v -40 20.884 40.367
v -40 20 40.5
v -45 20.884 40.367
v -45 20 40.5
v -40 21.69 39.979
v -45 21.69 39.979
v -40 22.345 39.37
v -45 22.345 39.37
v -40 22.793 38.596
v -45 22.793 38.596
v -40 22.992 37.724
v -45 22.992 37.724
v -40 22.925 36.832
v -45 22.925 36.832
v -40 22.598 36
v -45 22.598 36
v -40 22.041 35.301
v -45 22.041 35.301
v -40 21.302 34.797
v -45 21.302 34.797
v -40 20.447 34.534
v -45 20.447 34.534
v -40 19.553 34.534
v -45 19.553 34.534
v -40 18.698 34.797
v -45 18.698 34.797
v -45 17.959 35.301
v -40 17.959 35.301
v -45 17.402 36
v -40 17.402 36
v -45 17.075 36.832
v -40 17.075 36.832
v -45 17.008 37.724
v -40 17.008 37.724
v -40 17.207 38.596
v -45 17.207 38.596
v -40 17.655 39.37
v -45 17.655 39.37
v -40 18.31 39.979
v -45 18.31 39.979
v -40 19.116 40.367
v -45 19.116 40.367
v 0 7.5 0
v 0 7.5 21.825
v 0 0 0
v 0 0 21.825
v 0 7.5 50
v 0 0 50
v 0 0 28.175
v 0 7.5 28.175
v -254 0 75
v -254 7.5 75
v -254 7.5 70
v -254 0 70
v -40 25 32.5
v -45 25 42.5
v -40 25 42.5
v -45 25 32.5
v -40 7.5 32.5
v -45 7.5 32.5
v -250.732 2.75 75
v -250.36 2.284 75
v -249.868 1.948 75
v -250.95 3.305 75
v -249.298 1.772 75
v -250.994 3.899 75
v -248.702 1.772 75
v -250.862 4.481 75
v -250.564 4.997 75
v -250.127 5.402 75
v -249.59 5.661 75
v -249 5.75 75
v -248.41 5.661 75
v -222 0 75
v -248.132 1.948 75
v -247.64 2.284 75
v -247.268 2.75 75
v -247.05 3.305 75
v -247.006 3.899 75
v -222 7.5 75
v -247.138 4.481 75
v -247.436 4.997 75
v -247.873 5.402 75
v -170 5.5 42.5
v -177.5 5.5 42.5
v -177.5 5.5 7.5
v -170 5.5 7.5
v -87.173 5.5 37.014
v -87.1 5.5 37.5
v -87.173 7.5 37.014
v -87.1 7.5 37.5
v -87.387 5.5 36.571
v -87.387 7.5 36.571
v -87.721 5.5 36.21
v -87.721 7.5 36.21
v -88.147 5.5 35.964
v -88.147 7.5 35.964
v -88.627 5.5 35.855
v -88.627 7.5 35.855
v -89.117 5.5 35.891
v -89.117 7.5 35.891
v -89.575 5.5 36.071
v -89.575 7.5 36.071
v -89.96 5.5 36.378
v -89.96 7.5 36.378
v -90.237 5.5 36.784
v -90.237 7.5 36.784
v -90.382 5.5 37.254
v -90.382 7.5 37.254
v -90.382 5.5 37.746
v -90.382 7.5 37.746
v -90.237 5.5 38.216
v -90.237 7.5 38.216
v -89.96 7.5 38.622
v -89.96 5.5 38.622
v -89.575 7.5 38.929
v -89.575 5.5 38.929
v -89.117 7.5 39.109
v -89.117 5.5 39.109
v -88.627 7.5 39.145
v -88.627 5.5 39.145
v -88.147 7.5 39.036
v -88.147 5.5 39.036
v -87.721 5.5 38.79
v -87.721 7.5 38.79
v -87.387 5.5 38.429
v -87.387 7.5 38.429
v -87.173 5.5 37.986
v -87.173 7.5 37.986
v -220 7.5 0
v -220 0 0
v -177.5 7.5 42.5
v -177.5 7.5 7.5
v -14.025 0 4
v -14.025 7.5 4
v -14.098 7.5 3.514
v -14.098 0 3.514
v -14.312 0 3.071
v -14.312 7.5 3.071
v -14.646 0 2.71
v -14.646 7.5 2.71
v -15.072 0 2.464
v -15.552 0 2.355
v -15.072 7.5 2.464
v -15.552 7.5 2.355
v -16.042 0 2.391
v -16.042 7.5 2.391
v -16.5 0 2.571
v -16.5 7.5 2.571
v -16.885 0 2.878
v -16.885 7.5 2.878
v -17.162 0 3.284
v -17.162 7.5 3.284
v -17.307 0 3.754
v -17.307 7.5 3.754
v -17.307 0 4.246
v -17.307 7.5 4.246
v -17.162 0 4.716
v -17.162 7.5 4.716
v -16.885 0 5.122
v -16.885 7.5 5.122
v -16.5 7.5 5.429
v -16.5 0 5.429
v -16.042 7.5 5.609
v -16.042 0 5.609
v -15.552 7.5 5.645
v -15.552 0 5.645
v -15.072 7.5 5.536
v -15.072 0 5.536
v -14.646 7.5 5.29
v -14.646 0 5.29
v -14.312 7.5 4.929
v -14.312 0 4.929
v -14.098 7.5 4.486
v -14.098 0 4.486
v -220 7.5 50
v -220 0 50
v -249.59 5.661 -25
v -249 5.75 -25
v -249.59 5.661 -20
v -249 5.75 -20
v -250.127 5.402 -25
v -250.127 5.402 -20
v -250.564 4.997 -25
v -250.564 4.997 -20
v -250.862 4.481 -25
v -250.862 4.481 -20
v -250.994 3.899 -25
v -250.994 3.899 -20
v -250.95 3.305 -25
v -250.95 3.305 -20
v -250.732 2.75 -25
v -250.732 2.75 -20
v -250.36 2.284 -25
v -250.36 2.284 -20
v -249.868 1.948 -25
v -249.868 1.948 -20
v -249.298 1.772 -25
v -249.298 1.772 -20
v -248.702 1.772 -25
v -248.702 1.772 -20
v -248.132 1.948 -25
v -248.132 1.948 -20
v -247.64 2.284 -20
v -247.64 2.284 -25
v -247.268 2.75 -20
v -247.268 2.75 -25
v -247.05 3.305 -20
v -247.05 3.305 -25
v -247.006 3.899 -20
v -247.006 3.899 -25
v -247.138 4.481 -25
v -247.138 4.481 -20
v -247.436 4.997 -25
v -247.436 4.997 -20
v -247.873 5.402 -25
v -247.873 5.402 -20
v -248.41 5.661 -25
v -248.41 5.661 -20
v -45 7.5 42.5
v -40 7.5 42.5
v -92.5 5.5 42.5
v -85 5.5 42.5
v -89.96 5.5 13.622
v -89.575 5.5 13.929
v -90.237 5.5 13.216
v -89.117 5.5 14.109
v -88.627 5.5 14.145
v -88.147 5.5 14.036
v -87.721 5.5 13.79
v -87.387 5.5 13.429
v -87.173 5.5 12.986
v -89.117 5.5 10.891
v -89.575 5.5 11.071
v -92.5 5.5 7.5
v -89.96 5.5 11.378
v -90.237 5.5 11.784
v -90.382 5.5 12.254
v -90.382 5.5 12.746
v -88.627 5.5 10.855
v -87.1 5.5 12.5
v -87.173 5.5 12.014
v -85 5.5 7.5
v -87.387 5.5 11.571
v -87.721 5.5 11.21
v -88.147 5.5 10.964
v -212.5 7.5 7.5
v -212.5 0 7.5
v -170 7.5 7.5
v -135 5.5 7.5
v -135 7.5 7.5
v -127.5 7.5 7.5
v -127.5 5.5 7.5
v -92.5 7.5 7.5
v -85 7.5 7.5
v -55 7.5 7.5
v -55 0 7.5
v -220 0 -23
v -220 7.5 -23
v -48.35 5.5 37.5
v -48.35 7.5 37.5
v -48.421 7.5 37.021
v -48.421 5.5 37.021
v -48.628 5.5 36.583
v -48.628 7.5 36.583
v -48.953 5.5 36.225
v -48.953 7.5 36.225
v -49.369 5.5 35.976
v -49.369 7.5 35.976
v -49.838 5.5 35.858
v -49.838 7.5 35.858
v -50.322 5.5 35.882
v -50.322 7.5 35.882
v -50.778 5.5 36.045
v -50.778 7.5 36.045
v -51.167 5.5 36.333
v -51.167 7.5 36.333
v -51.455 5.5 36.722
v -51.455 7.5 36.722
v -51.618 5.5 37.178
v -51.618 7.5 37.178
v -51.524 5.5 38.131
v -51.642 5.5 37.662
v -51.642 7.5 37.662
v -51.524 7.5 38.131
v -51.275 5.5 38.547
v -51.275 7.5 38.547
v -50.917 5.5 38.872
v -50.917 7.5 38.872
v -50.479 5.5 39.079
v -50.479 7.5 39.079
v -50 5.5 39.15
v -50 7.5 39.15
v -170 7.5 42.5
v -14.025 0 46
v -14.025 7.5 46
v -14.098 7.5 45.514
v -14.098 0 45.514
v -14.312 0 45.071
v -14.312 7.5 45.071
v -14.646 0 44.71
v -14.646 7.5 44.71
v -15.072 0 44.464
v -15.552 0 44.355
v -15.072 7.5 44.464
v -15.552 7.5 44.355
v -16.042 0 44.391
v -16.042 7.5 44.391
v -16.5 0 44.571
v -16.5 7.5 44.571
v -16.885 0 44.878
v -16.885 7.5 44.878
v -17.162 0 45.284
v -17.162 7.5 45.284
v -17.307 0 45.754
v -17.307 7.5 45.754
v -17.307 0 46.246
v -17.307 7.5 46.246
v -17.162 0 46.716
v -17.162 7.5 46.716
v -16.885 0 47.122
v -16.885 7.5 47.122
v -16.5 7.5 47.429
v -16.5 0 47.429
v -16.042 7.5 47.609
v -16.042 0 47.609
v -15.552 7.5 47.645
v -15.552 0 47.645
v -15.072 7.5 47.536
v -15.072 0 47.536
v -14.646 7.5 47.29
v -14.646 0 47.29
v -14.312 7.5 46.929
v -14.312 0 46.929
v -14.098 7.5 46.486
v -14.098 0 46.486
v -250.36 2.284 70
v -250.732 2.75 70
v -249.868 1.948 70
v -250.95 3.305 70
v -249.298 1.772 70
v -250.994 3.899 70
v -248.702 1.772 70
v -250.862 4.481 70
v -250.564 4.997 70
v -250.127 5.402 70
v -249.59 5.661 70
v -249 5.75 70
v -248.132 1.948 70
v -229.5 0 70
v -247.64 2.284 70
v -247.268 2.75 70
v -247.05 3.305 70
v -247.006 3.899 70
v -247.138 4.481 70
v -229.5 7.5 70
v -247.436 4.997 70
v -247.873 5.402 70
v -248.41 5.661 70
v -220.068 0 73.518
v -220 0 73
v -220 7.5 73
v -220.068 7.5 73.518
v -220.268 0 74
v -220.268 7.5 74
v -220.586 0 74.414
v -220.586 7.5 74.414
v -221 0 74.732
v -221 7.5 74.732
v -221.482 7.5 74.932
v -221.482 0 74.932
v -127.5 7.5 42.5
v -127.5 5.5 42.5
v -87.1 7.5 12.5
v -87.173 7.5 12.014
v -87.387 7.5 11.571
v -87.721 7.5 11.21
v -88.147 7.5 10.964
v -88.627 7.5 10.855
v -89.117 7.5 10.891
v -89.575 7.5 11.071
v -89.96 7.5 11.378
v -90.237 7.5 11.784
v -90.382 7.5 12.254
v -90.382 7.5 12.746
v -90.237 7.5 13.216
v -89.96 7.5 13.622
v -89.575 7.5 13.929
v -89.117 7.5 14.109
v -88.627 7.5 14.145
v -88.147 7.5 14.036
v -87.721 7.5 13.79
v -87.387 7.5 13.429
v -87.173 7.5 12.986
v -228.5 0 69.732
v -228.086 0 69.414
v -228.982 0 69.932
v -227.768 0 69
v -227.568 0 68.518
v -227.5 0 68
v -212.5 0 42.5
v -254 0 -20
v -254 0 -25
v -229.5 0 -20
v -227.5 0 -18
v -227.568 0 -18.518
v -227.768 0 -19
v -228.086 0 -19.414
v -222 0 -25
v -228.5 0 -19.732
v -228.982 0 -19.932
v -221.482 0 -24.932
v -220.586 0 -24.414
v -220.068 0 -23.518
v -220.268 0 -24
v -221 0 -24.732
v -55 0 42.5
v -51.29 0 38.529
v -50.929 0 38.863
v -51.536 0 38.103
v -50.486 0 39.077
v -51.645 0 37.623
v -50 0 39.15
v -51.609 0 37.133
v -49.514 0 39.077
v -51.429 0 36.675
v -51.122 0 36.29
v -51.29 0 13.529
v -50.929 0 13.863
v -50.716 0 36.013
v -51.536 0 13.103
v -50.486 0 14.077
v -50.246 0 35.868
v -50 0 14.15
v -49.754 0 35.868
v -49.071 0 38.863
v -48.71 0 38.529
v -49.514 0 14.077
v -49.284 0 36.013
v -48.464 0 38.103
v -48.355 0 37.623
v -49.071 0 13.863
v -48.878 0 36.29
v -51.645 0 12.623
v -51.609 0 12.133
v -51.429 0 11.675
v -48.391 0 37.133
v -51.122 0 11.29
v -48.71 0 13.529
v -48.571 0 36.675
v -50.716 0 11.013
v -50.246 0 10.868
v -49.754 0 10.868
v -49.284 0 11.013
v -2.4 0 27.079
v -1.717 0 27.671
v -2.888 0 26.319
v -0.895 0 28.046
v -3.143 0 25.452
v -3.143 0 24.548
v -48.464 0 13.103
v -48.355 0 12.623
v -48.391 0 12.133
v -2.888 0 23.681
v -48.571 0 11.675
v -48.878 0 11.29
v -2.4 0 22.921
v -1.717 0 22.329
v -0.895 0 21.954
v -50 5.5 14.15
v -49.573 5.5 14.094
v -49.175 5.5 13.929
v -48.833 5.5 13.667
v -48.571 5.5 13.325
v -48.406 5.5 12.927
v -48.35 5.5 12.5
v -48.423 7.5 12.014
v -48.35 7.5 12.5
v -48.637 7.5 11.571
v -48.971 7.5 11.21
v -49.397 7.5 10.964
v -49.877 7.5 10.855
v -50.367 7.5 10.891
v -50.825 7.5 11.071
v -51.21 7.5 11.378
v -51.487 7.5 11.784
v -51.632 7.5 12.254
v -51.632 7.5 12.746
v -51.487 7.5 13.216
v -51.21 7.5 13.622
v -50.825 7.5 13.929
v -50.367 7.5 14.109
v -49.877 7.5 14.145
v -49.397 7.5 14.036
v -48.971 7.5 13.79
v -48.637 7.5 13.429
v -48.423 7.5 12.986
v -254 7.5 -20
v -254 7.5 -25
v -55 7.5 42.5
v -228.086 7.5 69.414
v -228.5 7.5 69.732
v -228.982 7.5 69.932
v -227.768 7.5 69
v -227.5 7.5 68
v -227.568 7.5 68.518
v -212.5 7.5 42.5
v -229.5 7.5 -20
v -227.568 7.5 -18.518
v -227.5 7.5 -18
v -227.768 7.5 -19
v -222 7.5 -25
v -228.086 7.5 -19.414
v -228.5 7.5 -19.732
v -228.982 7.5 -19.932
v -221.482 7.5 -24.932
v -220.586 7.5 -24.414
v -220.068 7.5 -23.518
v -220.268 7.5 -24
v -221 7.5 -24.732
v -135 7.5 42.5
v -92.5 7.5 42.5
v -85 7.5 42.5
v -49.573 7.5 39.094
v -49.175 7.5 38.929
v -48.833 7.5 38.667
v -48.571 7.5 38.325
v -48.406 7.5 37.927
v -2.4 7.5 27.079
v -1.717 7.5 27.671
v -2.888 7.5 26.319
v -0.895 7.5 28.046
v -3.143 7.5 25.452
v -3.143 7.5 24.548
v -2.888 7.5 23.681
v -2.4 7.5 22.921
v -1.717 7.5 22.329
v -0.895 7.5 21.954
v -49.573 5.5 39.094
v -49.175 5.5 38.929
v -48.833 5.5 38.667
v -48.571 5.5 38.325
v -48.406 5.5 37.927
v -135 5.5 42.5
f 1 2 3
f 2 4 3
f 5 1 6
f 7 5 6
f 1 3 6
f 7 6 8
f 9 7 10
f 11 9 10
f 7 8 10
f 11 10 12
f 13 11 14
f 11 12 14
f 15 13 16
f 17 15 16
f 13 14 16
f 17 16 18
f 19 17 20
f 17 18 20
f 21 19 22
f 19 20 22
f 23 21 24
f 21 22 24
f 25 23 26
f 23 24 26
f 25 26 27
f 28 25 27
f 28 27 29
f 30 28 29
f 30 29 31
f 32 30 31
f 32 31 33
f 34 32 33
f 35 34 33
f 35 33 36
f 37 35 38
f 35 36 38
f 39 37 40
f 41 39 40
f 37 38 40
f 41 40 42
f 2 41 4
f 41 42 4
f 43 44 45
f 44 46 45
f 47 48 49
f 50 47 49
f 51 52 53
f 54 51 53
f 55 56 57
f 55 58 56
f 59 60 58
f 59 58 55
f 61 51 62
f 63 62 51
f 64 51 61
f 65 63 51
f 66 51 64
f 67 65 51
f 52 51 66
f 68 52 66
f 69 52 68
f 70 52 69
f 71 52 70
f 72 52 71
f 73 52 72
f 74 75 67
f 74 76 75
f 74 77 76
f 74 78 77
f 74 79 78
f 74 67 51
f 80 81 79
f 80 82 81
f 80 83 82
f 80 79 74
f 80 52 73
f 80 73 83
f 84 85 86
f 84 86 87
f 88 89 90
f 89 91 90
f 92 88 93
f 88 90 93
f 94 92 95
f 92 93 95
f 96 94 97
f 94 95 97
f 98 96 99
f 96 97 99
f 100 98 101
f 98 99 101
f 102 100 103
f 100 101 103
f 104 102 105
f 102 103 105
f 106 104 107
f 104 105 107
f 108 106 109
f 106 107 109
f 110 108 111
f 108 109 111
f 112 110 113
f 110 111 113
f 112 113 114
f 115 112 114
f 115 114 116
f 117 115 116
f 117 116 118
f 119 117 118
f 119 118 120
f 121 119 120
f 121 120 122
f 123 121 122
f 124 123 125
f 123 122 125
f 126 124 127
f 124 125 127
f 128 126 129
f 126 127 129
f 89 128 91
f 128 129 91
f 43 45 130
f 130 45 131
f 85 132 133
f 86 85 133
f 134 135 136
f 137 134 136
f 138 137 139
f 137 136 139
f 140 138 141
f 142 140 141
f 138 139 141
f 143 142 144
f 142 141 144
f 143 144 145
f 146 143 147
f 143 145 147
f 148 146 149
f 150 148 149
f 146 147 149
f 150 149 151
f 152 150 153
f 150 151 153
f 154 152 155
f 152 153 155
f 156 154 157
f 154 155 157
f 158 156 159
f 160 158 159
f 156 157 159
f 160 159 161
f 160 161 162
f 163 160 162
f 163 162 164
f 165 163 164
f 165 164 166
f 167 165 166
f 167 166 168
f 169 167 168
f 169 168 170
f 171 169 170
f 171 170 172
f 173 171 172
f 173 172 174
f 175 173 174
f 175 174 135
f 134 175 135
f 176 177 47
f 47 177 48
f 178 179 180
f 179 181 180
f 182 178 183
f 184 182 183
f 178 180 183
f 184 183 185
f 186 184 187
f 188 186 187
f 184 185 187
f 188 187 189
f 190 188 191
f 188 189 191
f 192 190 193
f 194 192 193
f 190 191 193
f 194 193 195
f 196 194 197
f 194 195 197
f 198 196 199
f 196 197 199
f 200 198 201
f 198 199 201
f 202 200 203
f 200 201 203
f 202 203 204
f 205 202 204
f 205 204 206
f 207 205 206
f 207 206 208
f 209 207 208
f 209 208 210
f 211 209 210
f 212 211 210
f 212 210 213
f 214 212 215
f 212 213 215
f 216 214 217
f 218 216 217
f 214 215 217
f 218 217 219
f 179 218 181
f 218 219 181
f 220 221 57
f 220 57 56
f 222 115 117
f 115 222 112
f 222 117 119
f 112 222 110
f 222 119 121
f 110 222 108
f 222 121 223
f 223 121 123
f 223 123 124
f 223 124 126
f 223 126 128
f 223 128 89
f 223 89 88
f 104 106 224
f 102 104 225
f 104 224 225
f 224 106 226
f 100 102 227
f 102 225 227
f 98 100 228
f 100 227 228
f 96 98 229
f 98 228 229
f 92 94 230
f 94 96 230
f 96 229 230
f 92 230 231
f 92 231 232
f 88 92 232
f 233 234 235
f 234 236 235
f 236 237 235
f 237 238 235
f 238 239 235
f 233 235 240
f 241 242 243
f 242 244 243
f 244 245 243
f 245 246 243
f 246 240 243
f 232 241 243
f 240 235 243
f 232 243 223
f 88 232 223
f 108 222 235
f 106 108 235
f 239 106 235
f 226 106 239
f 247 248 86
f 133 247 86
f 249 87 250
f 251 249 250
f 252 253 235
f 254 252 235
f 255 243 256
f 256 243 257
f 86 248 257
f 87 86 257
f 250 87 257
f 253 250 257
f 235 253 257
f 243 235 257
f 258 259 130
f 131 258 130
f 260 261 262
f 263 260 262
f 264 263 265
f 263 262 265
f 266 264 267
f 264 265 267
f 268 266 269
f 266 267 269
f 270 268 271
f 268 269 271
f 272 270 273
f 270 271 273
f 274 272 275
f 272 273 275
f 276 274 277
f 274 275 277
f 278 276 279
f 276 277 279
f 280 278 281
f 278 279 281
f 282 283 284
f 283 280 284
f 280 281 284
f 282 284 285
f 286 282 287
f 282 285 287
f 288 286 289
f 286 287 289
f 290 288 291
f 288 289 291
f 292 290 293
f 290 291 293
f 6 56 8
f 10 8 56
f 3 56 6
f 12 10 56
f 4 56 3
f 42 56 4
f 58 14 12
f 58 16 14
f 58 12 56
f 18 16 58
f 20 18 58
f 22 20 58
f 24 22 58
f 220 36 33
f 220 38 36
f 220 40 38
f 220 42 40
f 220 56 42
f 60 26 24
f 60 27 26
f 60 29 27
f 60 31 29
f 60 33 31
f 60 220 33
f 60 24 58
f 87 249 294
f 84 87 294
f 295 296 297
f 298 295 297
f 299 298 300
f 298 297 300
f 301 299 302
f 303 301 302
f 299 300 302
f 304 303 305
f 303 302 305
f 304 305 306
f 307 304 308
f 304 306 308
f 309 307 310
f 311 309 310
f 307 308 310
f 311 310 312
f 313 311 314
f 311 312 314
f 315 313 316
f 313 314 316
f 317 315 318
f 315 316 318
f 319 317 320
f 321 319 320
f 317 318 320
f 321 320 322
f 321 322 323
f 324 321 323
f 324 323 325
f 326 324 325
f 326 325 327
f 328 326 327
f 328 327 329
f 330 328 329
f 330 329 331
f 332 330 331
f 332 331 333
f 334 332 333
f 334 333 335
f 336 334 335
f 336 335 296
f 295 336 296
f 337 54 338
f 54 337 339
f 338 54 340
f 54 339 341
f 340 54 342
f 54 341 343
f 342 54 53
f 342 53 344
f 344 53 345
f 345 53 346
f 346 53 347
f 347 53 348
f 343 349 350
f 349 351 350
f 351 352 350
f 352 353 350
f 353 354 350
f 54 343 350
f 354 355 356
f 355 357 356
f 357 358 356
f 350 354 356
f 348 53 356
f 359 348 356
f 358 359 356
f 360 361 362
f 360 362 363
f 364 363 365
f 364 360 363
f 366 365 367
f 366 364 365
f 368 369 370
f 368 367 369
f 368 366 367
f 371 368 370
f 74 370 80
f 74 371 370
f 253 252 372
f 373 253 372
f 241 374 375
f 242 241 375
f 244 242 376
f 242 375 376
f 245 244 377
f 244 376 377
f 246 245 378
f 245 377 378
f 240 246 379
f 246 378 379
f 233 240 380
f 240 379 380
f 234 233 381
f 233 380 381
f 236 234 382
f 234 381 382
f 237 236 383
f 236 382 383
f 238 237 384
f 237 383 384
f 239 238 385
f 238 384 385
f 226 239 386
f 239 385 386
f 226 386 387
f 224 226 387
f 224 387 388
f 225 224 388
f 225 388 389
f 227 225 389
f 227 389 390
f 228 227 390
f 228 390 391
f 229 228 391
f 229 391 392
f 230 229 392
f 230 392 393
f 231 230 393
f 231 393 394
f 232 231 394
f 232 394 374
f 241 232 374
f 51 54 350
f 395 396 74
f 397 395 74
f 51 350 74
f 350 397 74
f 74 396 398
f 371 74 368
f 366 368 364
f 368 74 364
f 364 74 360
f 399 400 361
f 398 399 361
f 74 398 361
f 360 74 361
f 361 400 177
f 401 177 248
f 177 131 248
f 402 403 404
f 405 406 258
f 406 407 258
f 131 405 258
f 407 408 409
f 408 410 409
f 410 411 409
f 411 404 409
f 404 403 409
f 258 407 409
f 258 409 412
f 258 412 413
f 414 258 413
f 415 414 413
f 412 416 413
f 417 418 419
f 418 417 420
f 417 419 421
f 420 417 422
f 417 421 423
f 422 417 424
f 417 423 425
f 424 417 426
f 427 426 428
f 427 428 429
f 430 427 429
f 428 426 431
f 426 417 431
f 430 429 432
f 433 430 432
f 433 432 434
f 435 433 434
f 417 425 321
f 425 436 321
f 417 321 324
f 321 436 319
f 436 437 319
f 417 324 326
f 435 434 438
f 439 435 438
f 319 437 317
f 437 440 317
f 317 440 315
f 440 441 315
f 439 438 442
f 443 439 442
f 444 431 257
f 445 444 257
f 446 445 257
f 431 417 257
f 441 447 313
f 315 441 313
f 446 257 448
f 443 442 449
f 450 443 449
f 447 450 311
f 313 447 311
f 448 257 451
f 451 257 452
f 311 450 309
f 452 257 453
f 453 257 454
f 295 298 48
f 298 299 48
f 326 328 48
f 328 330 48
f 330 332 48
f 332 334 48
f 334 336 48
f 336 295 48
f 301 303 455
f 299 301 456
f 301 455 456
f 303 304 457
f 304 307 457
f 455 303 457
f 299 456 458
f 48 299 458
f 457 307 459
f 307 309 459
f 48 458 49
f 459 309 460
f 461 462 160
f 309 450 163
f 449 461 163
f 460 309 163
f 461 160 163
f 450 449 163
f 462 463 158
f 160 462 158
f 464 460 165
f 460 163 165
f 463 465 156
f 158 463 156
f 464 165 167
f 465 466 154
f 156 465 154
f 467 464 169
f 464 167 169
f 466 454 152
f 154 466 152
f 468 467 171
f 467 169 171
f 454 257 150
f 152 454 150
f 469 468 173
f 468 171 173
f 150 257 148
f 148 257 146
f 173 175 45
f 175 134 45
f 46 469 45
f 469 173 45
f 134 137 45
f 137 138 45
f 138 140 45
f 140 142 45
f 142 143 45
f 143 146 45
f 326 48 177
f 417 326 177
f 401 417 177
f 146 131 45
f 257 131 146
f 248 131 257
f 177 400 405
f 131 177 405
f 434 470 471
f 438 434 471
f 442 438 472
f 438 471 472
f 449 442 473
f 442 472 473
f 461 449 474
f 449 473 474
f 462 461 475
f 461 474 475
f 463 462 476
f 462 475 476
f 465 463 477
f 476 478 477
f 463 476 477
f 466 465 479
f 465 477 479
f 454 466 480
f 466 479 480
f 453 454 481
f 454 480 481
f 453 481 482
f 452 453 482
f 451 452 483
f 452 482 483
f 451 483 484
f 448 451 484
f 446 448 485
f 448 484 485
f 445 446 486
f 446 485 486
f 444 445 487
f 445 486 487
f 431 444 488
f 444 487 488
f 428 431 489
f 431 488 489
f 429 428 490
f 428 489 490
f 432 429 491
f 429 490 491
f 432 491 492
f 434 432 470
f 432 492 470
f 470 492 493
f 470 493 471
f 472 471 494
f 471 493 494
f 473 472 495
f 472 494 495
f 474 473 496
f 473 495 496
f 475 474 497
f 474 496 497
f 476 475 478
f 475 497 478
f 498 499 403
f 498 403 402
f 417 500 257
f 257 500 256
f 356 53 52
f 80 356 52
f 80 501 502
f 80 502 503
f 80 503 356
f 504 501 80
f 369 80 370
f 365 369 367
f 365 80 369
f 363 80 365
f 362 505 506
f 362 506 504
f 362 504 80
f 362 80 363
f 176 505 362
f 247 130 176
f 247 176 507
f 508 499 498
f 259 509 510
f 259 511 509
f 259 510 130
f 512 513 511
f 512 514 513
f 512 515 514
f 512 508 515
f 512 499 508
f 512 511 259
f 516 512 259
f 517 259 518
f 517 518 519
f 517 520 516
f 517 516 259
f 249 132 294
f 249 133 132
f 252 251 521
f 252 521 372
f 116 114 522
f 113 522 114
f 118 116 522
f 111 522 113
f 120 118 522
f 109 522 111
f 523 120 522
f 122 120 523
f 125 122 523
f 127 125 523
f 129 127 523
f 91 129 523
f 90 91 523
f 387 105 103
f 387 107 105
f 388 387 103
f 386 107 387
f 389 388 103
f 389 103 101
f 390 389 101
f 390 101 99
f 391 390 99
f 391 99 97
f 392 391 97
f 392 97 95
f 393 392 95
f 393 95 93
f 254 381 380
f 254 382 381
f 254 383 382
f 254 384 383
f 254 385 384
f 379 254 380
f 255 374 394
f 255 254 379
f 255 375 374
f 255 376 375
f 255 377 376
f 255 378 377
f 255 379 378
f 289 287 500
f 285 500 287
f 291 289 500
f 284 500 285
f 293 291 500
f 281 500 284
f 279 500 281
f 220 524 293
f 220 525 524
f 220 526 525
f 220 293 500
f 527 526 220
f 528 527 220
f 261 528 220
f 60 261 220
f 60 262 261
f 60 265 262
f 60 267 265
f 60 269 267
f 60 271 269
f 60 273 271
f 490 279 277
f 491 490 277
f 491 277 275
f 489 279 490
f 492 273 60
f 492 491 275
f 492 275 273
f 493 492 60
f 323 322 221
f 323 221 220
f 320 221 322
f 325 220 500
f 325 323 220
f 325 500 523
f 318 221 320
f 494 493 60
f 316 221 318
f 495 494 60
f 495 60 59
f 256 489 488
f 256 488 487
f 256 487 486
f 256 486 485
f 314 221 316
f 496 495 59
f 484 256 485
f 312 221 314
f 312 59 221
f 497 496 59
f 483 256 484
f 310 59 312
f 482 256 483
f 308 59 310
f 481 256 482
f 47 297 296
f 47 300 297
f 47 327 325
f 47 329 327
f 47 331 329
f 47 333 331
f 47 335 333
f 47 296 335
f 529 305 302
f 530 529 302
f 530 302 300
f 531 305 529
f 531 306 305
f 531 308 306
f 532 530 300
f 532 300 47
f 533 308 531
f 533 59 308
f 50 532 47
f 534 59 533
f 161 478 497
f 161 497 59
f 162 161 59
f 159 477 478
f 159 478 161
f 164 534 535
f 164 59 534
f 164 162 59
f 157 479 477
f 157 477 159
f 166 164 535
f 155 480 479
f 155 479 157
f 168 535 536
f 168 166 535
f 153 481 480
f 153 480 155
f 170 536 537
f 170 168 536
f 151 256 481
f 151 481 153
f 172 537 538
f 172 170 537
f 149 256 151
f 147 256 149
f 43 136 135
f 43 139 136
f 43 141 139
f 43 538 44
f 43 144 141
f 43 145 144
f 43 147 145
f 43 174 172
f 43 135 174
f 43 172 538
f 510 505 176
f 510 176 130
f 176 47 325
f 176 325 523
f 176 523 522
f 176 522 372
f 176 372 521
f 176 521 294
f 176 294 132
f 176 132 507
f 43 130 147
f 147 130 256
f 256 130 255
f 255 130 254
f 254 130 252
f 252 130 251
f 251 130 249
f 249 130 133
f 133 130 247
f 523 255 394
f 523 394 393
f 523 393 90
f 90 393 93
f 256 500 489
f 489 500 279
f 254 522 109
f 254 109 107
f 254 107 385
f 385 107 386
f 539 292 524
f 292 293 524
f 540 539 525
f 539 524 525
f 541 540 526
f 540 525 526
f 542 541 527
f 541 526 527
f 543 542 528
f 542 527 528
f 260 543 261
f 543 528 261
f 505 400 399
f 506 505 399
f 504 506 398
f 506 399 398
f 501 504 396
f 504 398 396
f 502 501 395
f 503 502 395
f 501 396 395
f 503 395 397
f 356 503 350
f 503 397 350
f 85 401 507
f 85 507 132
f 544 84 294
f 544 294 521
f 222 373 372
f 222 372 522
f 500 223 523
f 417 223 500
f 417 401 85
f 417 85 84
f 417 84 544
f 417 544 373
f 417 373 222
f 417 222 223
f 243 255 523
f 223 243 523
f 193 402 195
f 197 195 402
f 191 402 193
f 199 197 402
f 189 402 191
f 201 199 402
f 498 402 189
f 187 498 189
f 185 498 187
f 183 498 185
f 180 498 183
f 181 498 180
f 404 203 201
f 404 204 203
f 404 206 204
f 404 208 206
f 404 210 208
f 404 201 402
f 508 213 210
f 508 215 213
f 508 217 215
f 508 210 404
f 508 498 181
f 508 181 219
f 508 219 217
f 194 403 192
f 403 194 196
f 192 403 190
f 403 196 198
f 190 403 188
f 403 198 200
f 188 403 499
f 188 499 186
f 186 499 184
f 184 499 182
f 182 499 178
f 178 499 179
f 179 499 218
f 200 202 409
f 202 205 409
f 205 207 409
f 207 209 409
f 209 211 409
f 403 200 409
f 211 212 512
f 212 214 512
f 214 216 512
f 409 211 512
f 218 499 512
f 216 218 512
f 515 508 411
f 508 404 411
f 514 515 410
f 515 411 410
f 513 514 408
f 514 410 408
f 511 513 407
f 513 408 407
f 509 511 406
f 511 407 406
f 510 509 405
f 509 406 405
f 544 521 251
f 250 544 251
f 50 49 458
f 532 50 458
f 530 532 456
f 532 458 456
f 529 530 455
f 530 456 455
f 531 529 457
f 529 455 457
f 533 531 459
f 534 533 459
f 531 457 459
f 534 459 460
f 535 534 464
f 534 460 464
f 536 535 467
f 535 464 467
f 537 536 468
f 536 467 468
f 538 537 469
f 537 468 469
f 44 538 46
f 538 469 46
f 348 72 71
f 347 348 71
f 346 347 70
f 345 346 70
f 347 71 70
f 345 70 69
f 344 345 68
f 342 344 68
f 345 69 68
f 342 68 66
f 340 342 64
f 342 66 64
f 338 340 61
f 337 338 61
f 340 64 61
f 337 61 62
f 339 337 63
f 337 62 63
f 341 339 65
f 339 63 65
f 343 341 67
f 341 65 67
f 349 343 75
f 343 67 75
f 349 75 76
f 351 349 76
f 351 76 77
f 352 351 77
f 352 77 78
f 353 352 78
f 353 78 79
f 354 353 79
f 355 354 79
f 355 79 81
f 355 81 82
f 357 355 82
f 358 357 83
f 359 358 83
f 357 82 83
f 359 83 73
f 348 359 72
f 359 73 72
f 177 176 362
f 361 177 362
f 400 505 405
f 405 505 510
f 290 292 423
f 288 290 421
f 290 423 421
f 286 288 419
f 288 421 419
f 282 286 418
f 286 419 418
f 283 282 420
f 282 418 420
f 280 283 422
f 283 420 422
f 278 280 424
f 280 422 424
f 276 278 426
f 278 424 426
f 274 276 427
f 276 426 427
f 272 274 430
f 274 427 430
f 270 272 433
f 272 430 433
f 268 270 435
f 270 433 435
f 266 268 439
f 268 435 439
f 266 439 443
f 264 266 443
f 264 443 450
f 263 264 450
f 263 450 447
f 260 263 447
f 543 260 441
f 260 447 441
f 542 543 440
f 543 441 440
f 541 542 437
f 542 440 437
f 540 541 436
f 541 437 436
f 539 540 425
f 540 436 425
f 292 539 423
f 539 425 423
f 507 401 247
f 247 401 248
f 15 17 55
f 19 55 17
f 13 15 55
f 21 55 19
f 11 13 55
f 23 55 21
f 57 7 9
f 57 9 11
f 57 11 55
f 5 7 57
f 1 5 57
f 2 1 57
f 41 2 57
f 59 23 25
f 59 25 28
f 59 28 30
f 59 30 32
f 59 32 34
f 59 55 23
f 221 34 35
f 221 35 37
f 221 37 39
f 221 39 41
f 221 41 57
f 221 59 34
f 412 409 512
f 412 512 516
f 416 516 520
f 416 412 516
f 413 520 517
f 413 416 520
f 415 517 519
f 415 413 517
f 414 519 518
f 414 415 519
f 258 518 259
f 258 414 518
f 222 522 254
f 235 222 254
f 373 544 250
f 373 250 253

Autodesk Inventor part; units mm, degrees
ref_plane "YZ Plane" through (0, 0, 0) normal (1, 0, 0) x (0, 1, 0)
ref_plane "XZ Plane" through (0, 0, 0) normal (0, 1, 0) x (-1, 0, 0)
ref_plane "XY Plane" through (0, 0, 0) normal (0, 0, 1) x (1, 0, 0)
sketch "Sketch1" plane through (0, 0, 0) normal (0, 1, 0) x (-1, 0, 0)
  line L0 (0, 0) -> (50, 0)
  line L1 (50, 0) -> (50, 50)
  line L2 (50, 50) -> (0, 50)
  line L3 (0, 50) -> (0, 0)
  line L4 (50, 50) -> (290, 50)
  line L5 (290, 50) -> (290, 42.5)
  line L6 (290, 42.5) -> (50, 42.5)
  line L7 (50, 42.5) -> (50, 50)
  line L8 (50, 0) -> (290, 0)
  line L9 (290, 0) -> (290, 7.5)
  line L10 (290, 7.5) -> (50, 7.5)
  line L11 (50, 7.5) -> (50, 0)
  dimension "d0" = 50
  dimension "d1" = 50
  dimension "d2" = 240
  dimension "d3" = 7.5
  dimension "d4" = 7.5
extrude "Extrusion1" add sketch "Sketch1" along normal blind 7.5
sketch "Sketch2" plane through (0, 7.5, 0) normal (0, 1, 0) x (1, 0, 0)
  line L0 (0, -50) -> (0, 0) projected
  point P0 (0, -25)
hole "Hole1" at (0, 7.5, 25) direction (0, -1, 0) diameter 6.35 end through all
sketch "Sketch3" plane through (0, 7.5, 0) normal (0, 1, 0) x (1, 0, 0)
  line L0 (-3.175, -50) -> (-3.175, 0) construction
  line L1 (-3.175, -50) -> (-28.175, -50) construction
  line L2 (-28.175, -50) -> (-28.175, 0) construction
  line L3 (-28.175, 0) -> (-3.175, 0) construction
  point P0 (0, 0)
  point P1 (-7.175, -4)
  point P2 (-24.175, -46)
  dimension "d14" = 25
hole "Hole2" at (-7.175, 7.5, 4) at (-24.175, 7.5, 46) direction (0, -1, 0) diameter 3.3 end through all
sketch "Sketch4" plane through (0, 7.5, 0) normal (0, 1, 0) x (1, 0, 0)
  arc A0 (0, -21.825) -> (0, -28.175) centre (0, -25) ccw construction
  line L0 (-3.175, -25) -> (-28.175, -25) construction
  line L1 (-3.175, -25) -> (21.825, -25) construction
  line L2 (-290, -50) -> (0, -50) construction
  line L3 (-28.175, -50) -> (-28.175, 0) construction
  line L4 (-50, -7.5) -> (-50, -42.5) construction
  line L5 (-50, -42.5) -> (-45, -42.5) construction
  line L6 (-45, -42.5) -> (-45, -32.5) construction
  line L7 (-45, -32.5) -> (-50, -32.5) construction
  line L8 (-50, -32.5) -> (-50, -42.5) construction
  line L9 (-45, -32.5) -> (-40, -32.5)
  line L10 (-40, -32.5) -> (-40, -42.5)
  line L11 (-40, -42.5) -> (-45, -42.5)
  line L12 (-45, -42.5) -> (-45, -32.5)
  point P0 (0, 0)
  dimension "d22" = 25
  dimension "d23" = 180
  dimension "d24" = 5
  dimension "d25" = 10
  dimension "d26" = 5
extrude "Extrusion2" add sketch "Sketch4" along normal blind 17.5
sketch "Sketch5" plane through (0, 7.5, 0) normal (0, 1, 0) x (1, 0, 0)
  line L0 (-85, -7.5) -> (-85, -42.5)
  line L1 (-127.5, -7.5) -> (-127.5, -42.5)
  line L2 (-92.5, -42.5) -> (-92.5, -7.5)
  line L3 (-135, -7.5) -> (-170, -7.5) construction
  line L4 (-170, -7.5) -> (-170, -42.5) construction
  line L5 (-170, -42.5) -> (-135, -42.5) construction
  line L6 (-135, -42.5) -> (-135, -7.5) construction
  line L7 (-177.5, -7.5) -> (-212.5, -7.5) construction
  line L8 (-212.5, -7.5) -> (-212.5, -42.5) construction
  line L9 (-212.5, -42.5) -> (-177.5, -42.5) construction
  line L10 (-177.5, -42.5) -> (-177.5, -7.5) construction
  line L11 (-220, -7.5) -> (-255, -7.5) construction
  line L12 (-255, -7.5) -> (-255, -42.5) construction
  line L13 (-255, -42.5) -> (-220, -42.5) construction
  line L14 (-220, -42.5) -> (-220, -7.5) construction
  line L15 (-85, -7.5) -> (-92.5, -7.5) construction
  line L16 (-92.5, -7.5) -> (-92.5, -42.5) construction
  line L17 (-92.5, -42.5) -> (-85, -42.5) construction
  line L18 (-85, -42.5) -> (-85, -7.5) construction
  line L19 (-127.5, -7.5) -> (-135, -7.5) construction
  line L20 (-135, -7.5) -> (-135, -42.5) construction
  line L21 (-135, -42.5) -> (-127.5, -42.5) construction
  line L22 (-127.5, -42.5) -> (-127.5, -7.5) construction
  line L23 (-170, -7.5) -> (-177.5, -7.5) construction
  line L24 (-177.5, -7.5) -> (-177.5, -42.5) construction
  line L25 (-177.5, -42.5) -> (-170, -42.5) construction
  line L26 (-170, -42.5) -> (-170, -7.5) construction
  line L27 (-212.5, -7.5) -> (-220, -7.5) construction
  line L28 (-220, -7.5) -> (-220, -42.5) construction
  line L29 (-220, -42.5) -> (-212.5, -42.5) construction
  line L30 (-212.5, -42.5) -> (-212.5, -7.5) construction
  line L31 (-220, -7.5) -> (-212.5, -7.5)
  line L32 (-212.5, -7.5) -> (-212.5, -42.5)
  line L33 (-212.5, -42.5) -> (-220, -42.5)
  line L34 (-220, -42.5) -> (-220, -7.5)
  line L35 (-177.5, -7.5) -> (-170, -7.5)
  line L36 (-170, -7.5) -> (-170, -42.5)
  line L37 (-170, -42.5) -> (-177.5, -42.5)
  line L38 (-177.5, -42.5) -> (-177.5, -7.5)
  line L39 (-135, -7.5) -> (-127.5, -7.5)
  line L40 (-127.5, -7.5) -> (-127.5, -42.5)
  line L41 (-127.5, -42.5) -> (-135, -42.5)
  line L42 (-135, -42.5) -> (-135, -7.5)
  line L43 (-92.5, -7.5) -> (-85, -7.5)
  line L44 (-85, -7.5) -> (-85, -42.5)
  line L45 (-85, -42.5) -> (-92.5, -42.5)
  line L46 (-92.5, -42.5) -> (-92.5, -7.5)
  point P0 (0, 0)
  point P1 (-50, -7.5)
  dimension "d30" = 35
  dimension "d31" = 35
  dimension "d32" = 35
  dimension "d33" = 35
  dimension "d34" = 35
  dimension "d35" = 35
extrude "Extrusion3" add sketch "Sketch5" against normal blind 2
sketch "Sketch6" plane through (0, 7.5, 0) normal (0, 1, 0) x (1, 0, 0)
  line L0 (-290, 0) -> (-290, -7.5) projected
  line L1 (-290, -50) -> (0, -50) projected
  line L2 (-290, 0) -> (-280, 0)
  line L3 (-280, 0) -> (-280, -50)
  line L4 (-280, -50) -> (-290, -50)
  line L5 (-290, -50) -> (-290, 0)
  point P0 (0, 0)
  dimension "d38" = 10
extrude "Extrusion4" cut sketch "Sketch6" against normal blind 7.5
sketch "Sketch7" plane through (-280, 7.5, 0) normal (-1, 0, 0) x (0, 0, 1)
  point P0 (0, -7.5)
sketch "Sketch8" plane through (-280, 7.5, 0) normal (-1, 0, 0) x (0, 0, 1)
  line L0 (-25, 0) -> (75, 0)
  line L1 (75, 0) -> (75, -7.5)
  line L2 (75, -7.5) -> (-25, -7.5)
  line L3 (-25, -7.5) -> (-25, 0)
  line L4 (-25, 0) -> (75, 0)
  line L5 (75, 0) -> (75, -10)
  line L6 (75, -10) -> (-25, -10)
  line L7 (-25, -10) -> (-25, 0)
  point P0 (0, -7.5)
  dimension "d41" = 100
  dimension "d42" = 10
extrude "Extrusion5" add sketch "Sketch8" along normal blind 7.5
sketch "Sketch9" plane through (-287.5, 7.5, 0) normal (-1, 0, 0) x (0, 0, 1)
  line L0 (75, 0) -> (-25, 0) projected
  line L1 (-25, -10) -> (75, -10) projected
  line L2 (-25, 0) -> (-17.5, 0)
  line L3 (-17.5, 0) -> (-17.5, -10)
  line L4 (-17.5, -10) -> (-25, -10)
  line L5 (-25, -10) -> (-25, 0)
  line L6 (75, 0) -> (67.5, 0)
  line L7 (67.5, 0) -> (67.5, -10)
  line L8 (67.5, -10) -> (75, -10)
  line L9 (75, -10) -> (75, 0)
  point P0 (0, -7.5)
  dimension "d45" = 7.5
  dimension "d46" = 7.5
extrude "Extrusion6" add sketch "Sketch9" along normal blind 25 contours L9 L1 L7 L0 | L3 L1 L5 L0
sketch "Sketch10" plane through (-287.5, -2.5, -17.5) normal (0, 0, 1) x (1, 0, 0)
  line L0 (0, 0) -> (-25, 0) construction
  line L1 (0, 0) -> (-3, 0) construction
  line L2 (-3, 0) -> (-6.2, 0)
  line L3 (-6.2, 0) -> (-6.2, 2.1)
  line L4 (-6.2, 2.1) -> (-3, 2.1)
  line L5 (-3, 2.1) -> (-3, 0)
  line L6 (-6.2, 2.1) -> (-11.7, 2.1) construction
  line L7 (-11.7, 2.1) -> (-11.7, 5.4) construction
  point P0 (287.5, 2.5)
  dimension "d49" = 3
  dimension "d50" = 3.2
  dimension "d51" = 2.1
  dimension "d52" = 5.5
  dimension "d53" = 3.3
extrude "Extrusion7" add sketch "Sketch10" along normal blind 92.5
sketch "Sketch11" plane through (-287.5, -2.5, -17.5) normal (0, 0, 1) x (1, 0, 0)
  line L0 (-6.2, 2.1) -> (-3, 2.1) construction
  line L1 (-6.2, 2.1) -> (-11.7, 2.1) construction
  line L2 (-11.7, 2.1) -> (-11.7, 5.4) construction
  circle A0 centre (-11.7, 5.4) radius 2.125
  point P0 (287.5, 2.5)
  dimension "d56" = 5.5
  dimension "d57" = 3.3
  dimension "d58" = 4.25
extrude "Extrusion8" cut sketch "Sketch11" along normal mid plane 241
sketch "Sketch12" plane through (-287.5, -2.5, -17.5) normal (0, 0, 1) x (1, 0, 0)
  circle A0 centre (-11.7, 5.4) radius 2.125 construction
  line L0 (-11.7, 5.4) -> (-11.7, 0.96) construction
  line L1 (-11.7, 0.96) -> (-16.7, 0.96) construction
  line L2 (-6.2, 0) -> (-25, 0) projected
  line L3 (-16.7, 0.96) -> (-19.2, 0.96)
  line L4 (-19.2, 0.96) -> (-19.2, 0)
  line L5 (-19.2, 0) -> (-16.7, 0)
  line L6 (-16.7, 0) -> (-16.7, 0.96)
  point P0 (287.5, 2.5)
  dimension "d61" = 4.44
  dimension "d62" = 5
  dimension "d63" = 2.5
extrude "Extrusion9" add sketch "Sketch12" along normal blind 91.25
sketch "Sketch13" plane through (-293.7, -0.4, -17.5) normal (0, 1, 0) x (1, 0, 0)
  line L0 (3.2, 0) -> (3.2, -85) construction
  line L1 (3.2, 0) -> (3.2, -30) construction
  line L2 (0, 0) -> (0, -85) construction
  line L3 (3.2, -30) -> (0, -30) construction
  line L4 (0, -30) -> (0, -36.35) construction
  line L5 (0, -36.35) -> (3.2, -36.35) construction
  line L6 (3.2, -36.35) -> (3.2, -30) construction
  line L7 (0, -30) -> (3.2, -30)
  line L8 (3.2, -30) -> (3.2, -36.35)
  line L9 (3.2, -36.35) -> (0, -36.35)
  line L10 (0, -36.35) -> (0, -30)
  point P0 (293.7, -17.5)
  dimension "d66" = 30
  dimension "d67" = 6.35
extrude "Extrusion10" add sketch "Sketch13" along normal blind 3.8
sketch "Sketch14" plane through (0, 7.5, 0) normal (0, 1, 0) x (1, 0, 0)
  line L0 (-287.5, 17.5) -> (-287.5, -67.5) projected
  line L1 (-287.5, 17.5) -> (-285, 17.5)
  line L2 (-285, 17.5) -> (-285, -67.5)
  line L3 (-285, -67.5) -> (-287.5, -67.5)
  line L4 (-287.5, -67.5) -> (-287.5, 17.5)
  point P0 (0, 0)
  dimension "d70" = 2.5
extrude "Extrusion11" cut sketch "Sketch14" against normal blind 14.55
sketch "Sketch15" plane through (0, 7.5, 0) normal (0, 1, 0) x (1, 0, 0)
  line L0 (-312.5, 17.5) -> (-312.5, 25) projected
  line L1 (-280, -75) -> (-312.5, -75) projected
  line L2 (-312.5, 25) -> (-306.6488, 25)
  line L3 (-306.6488, 25) -> (-306.6488, -75)
  line L4 (-306.6488, -75) -> (-312.5, -75)
  line L5 (-312.5, -75) -> (-312.5, 25)
  point P0 (0, 0)
extrude "Extrusion12" cut sketch "Sketch15" against normal blind 14.55
fillet "Fillet1" radius 0.1 1 edges at (-301.325, 2.9, -17.5)
fillet "Fillet2" radius 0.1 1 edges at (-301.325, 2.9, 67.5)
fillet "Fillet3" radius 3.25 1 edges at (-280, 2.5, 75)
fillet "Fillet4" radius 3.25 1 edges at (-285, 2.5, 67.5)
fillet "Fillet5" radius 3.25 1 edges at (-280, 2.5, -25)
fillet "Fillet6" radius 3.25 1 edges at (-285, 2.5, -17.5)
sketch "Sketch16" plane through (0, 7.5, 0) normal (0, 1, 0) x (1, 0, 0)
  line L0 (-220, -42.5) -> (-220, -7.5) construction
  line L1 (-220, -42.5) -> (-280, -42.5) construction
  line L2 (-220, -7.5) -> (-255, -7.5) construction
  line L3 (-255, -7.5) -> (-255, -42.5) construction
  line L4 (-255, -42.5) -> (-220, -42.5) construction
  line L5 (-220, -42.5) -> (-220, -7.5) construction
  line L6 (-280, -7.5) -> (-280, 0) projected
  line L7 (-280, -7.5) -> (-270, -7.5)
  line L8 (-270, -7.5) -> (-270, -42.5)
  line L9 (-270, -42.5) -> (-280, -42.5)
  line L10 (-280, -42.5) -> (-280, -7.5)
  point P0 (0, 0)
  dimension "d81" = 35
  dimension "d82" = 10
extrude "Extrusion13" add sketch "Sketch16" against normal blind 2
sketch "Sketch17" plane through (0, 7.5, 0) normal (0, 1, 0) x (1, 0, 0)
  point P0 (0, 0)
sketch "Sketch18" plane through (0, 7.5, 0) normal (0, 1, 0) x (1, 0, 0)
  line L0 (-270, -7.5) -> (-270, -42.5) construction
  line L1 (-285, -64.25) -> (-285, 14.25) construction
  line L2 (-280, -7.5) -> (-280, 0) construction
  line L3 (-270, -7.5) -> (-280, -7.5) construction
  line L4 (-275, -7.5) -> (-275, -42.5) construction
  line L5 (-50, -42.5) -> (-280, -42.5) construction
  circle A0 centre (-275, -12.5) radius 1.8 construction
  circle A1 centre (-275, -37.5) radius 1.8 construction
  circle A2 centre (-275, -12.5) radius 1.8
  circle A3 centre (-275, -37.5) radius 1.8
  point P0 (0, 0)
  dimension "d85" = 3.6
  dimension "d86" = 3.6
hole "Hole3" at (-275, 7.5, 12.5) at (-275, 7.5, 37.5) direction (0, -1, 0) diameter 3.3 depth 15 tip angle 118
sketch "Sketch19" plane through (0, 7.5, 0) normal (0, 1, 0) x (1, 0, 0)
  circle A0 centre (-275, -12.5) radius 1.65 construction
  line L0 (-275, -12.5) -> (-212.5, -12.5) construction
  line L1 (-212.5, -7.5) -> (-212.5, -42.5) construction
  circle A1 centre (-275, -37.5) radius 1.65 construction
  line L2 (-275, -37.5) -> (-212.5, -37.5) construction
  line L3 (-220, -42.5) -> (-220, -7.5) construction
  line L4 (-220, -12.5) -> (-212.5, -12.5) construction
  line L5 (-216.25, -12.5) -> (-216.25, -37.5) construction
  point P0 (0, 0)
hole "Hole4" at (-216.25, 7.5, 12.5) at (-216.25, 7.5, 37.5) direction (0, -1, 0) diameter 3.3 depth 15 tip angle 118
sketch "Sketch20" plane through (-45, 7.5, 32.5) normal (-1, 0, 0) x (0, 0, 1)
  line L0 (10, 17.5) -> (0, 17.5) construction
  line L1 (5, 17.5) -> (5, -0.1335) construction
  line L2 (10, 0) -> (10, 17.5) construction
  line L3 (10, 12.5) -> (5, 12.5) construction
  circle A0 centre (5, 12.5) radius 3
  point P0 (-32.5, -7.5)
  dimension "d101" = 6
extrude "Extrusion14" cut sketch "Sketch20" against normal blind 20
sketch "Sketch21" plane through (0, 7.5, 0) normal (0, 1, 0) x (1, 0, 0)
  line L0 (-306.6488, 17.5) -> (-306.6488, -67.5) projected
  line L1 (-306.6488, 17.5) -> (-288.25, 17.5) projected
  line L2 (-306.6488, -67.5) -> (-288.25, -67.5)
  line L3 (-288.25, -67.5) -> (-288.25, 17.5)
  line L4 (-288.25, 17.5) -> (-306.6488, 17.5)
  line L5 (-306.6488, 17.5) -> (-306.6488, -67.5)
  point P0 (0, 0)
extrude "Extrusion15" cut sketch "Sketch21" against normal blind 10
sketch "Sketch22" plane through (0, 7.5, 0) normal (0, 1, 0) x (1, 0, 0)
  line L0 (-280, -50) -> (0, -50) projected
  line L1 (0, 0) -> (-280, 0) projected
  line L2 (-280, -50) -> (-270.5687, -50)
  line L3 (-270.5687, -50) -> (-270.5687, 0)
  line L4 (-270.5687, 0) -> (-280, 0)
  line L5 (-280, 0) -> (-280, -50)
  line L6 (-50, -42.5) -> (-280, -42.5) projected
  line L7 (-219.3019, -42.5) -> (-213.3073, -42.5)
  line L8 (-213.3073, -42.5) -> (-213.3073, -8.284)
  line L9 (-213.3073, -8.284) -> (-219.3019, -8.284)
  line L10 (-219.3019, -8.284) -> (-219.3019, -42.5)
extrude "Extrusion16" add sketch "Sketch22" against normal blind 2
sketch "Sketch23" plane through (-306.6488, -2.5, -25) normal (0, 0, -1) x (-1, 0, 0)
  circle A0 centre (-7.4488, 5.4) radius 2.125 projected
  circle A1 centre (-7.4488, 5.4) radius 2
  circle A2 centre (-7.4488, 5.4) radius 2.4429
  point P0 (-306.6488, 2.5)
  dimension "d108" = 4
extrude "Extrusion17" add sketch "Sketch23" against normal blind 100 contours A0 | A2
sketch "Sketch24" plane through (0, 7.5, 0) normal (0, 1, 0) x (1, 0, 0)
  line L0 (-288.25, -67.5) -> (-306.6488, -67.5) projected
  arc A0 (-285, 14.25) -> (-288.25, 17.5) centre (-288.25, 14.25) ccw projected
  line L1 (-306.6488, -67.5) -> (-288.25, -67.5)
  line L2 (-288.25, -67.5) -> (-288.25, 17.5)
  line L3 (-288.25, 17.5) -> (-306.6488, 17.5)
  line L4 (-306.6488, 17.5) -> (-306.6488, -67.5)
  point P0 (0, 0)
extrude "Extrusion18" cut sketch "Sketch24" against normal blind 100
sketch "Sketch25" plane through (0, 7.5, 0) normal (0, 1, 0) x (1, 0, 0)
  line L0 (-50, -42.5) -> (-280, -42.5) projected
  line L1 (-280, -7.5) -> (-50, -7.5) projected
  line L2 (-50, -42.5) -> (-55, -42.5)
  line L3 (-55, -42.5) -> (-55, -7.5)
  line L4 (-55, -7.5) -> (-50, -7.5)
  line L5 (-50, -7.5) -> (-50, -42.5)
  point P0 (0, 0)
  dimension "d113" = 5
extrude "Extrusion19" add sketch "Sketch25" against normal blind 2
sketch "Sketch26" plane through (0, 7.5, 0) normal (0, 1, 0) x (1, 0, 0)
  line L0 (-55, -42.5) -> (-85, -42.5) construction
  line L1 (-55, -42.5) -> (-50, -42.5) construction
  line L2 (-55, -42.5) -> (-50, -42.5) construction
  line L3 (-50, -42.5) -> (-50, -7.5) construction
  line L4 (-50, -42.5) -> (-50, -7.5) construction
  circle A0 centre (-50, -37.5) radius 1.65 construction
  circle A1 centre (-50, -12.5) radius 1.65 construction
  circle A2 centre (-50, -37.5) radius 1.65
  circle A3 centre (-50, -12.5) radius 1.65
  line L5 (-50, -37.5) -> (-92.5, -37.5) construction
  line L6 (-92.5, -42.5) -> (-92.5, -7.5) construction
  line L7 (-50, -12.5) -> (-92.5, -12.5) construction
  line L8 (-92.5, -37.5) -> (-85, -37.5) construction
  line L9 (-85, -7.5) -> (-85, -42.5) construction
  line L10 (-88.75, -37.5) -> (-88.75, -12.5) construction
  circle A4 centre (-88.75, -37.5) radius 1.65
  circle A5 centre (-88.75, -12.5) radius 1.65
  point P0 (0, 0)
  dimension "d116" = 3.3
  dimension "d117" = 3.3
  dimension "d118" = 3.3
  dimension "d119" = 3.3
extrude "Extrusion20" cut sketch "Sketch26" against normal blind 2
sketch "Sketch27" plane through (0, 5.5, 0) normal (0, -1, 0) x (1, 0, 0)
  line L0 (-50, 7.5) -> (-55, 7.5) projected
  line L1 (-55, 7.5) -> (-46.6169, 7.5)
  line L2 (-46.6169, 7.5) -> (-46.6169, 42.5)
  line L3 (-46.6169, 42.5) -> (-55, 42.5)
  line L4 (-55, 42.5) -> (-55, 7.5)
  point P0 (0, 0)
extrude "Extrusion21" add sketch "Sketch27" along normal blind 5.5
sketch "Sketch28" plane through (0, 7.5, 0) normal (0, 1, 0) x (1, 0, 0)
  circle A0 centre (-50, -12.5) radius 1.65 projected
  circle A1 centre (-50, -37.5) radius 1.65 projected
  point P0 (0, 0)
hole "Hole5" at (-50, 7.5, 12.5) at (-50, 7.5, 37.5) direction (0, -1, 0) diameter 3.3 depth 8 tip angle 118
sketch "Sketch29" plane through (0, 7.5, 0) normal (0, 1, 0) x (1, 0, 0)
  circle A0 centre (-7.175, -4) radius 1.65 construction
  circle A1 centre (-24.175, -46) radius 1.65 construction
  line L0 (-7.175, -4) -> (-24.175, -46) construction
  line L1 (-7.175, -4) -> (-7.175, -46) construction
  line L2 (-7.175, -46) -> (-24.175, -46) construction
  line L3 (-7.175, -25) -> (-25.825, -25) construction
  line L4 (-25.825, -25) -> (-25.825, -46) construction
  line L5 (-16.5, -25) -> (-25.825, -25) construction
  line L6 (-24.175, -46) -> (-24.175, -25) construction
  line L7 (-15.675, -46) -> (-15.675, -4) construction
  line L8 (-40, -32.5) -> (-40, -42.5) construction
  line L9 (-40, -42.5) -> (-24.175, -42.5) construction
  line L10 (-24.175, -42.5) -> (-24.175, -46) construction
  line L11 (-15.675, -25) -> (-15.675, -46) construction
  line L12 (-15.675, -46) -> (-15.675, -4) construction
  circle A2 centre (-15.675, -46) radius 1.65 construction
  circle A3 centre (-15.675, -46) radius 1.65
  circle A4 centre (-15.675, -4) radius 1.65
  point P0 (0, 0)
  dimension "d131" = 42
  dimension "d132" = 17
  dimension "d133" = 21
  dimension "d135" = 8.5
  dimension "d136" = 15.825
  dimension "d137" = 3.5
  dimension "d138" = 21
  dimension "d139" = 3.3
  dimension "d140" = 3.3
  dimension "d141" = 3.3
extrude "Extrusion22" cut sketch "Sketch29" against normal blind 10
sketch "Sketch30" plane through (0, 7.5, 0) normal (0, 1, 0) x (1, 0, 0)
  circle A0 centre (-7.175, -4) radius 1.65 projected
  circle A1 centre (-7.175, -4) radius 2.1021
  circle A2 centre (-24.175, -46) radius 1.65 projected
  circle A3 centre (-24.175, -46) radius 2.9173
  point P0 (0, 0)
extrude "Extrusion23" add sketch "Sketch30" against normal blind 7.5 contours A0 | A1 | A2 | A3
sketch "Sketch31" plane through (0, 7.5, 0) normal (0, 1, 0) x (1, 0, 0)
  line L0 (-280, -50) -> (0, -50) projected
  line L1 (-269.9904, -50) -> (-212.5, -50)
  line L2 (-212.5, -50) -> (-212.5, 0)
  line L3 (-212.5, 0) -> (-269.9904, 0)
  line L4 (-269.9904, 0) -> (-269.9904, -50)
  point P0 (0, 0)
extrude "Extrusion24" cut sketch "Sketch31" against normal blind 100
sketch "Sketch32" plane through (0, 0, 0) normal (0, -1, 0) x (1, 0, 0)
  line L0 (-212.5, 42.5) -> (-212.5, 50) construction
  line L1 (-212.5, 50) -> (-254.5, 50) construction
  line L2 (-254.5, 50) -> (-254.5, 0) construction
  line L3 (-254.5, 0) -> (-212.5, 0) construction
  line L4 (-212.5, 0) -> (-212.5, 50) construction
  line L5 (-212.5, 0) -> (-220, 0)
  line L6 (-220, 0) -> (-220, 50)
  line L7 (-220, 50) -> (-212.5, 50)
  line L8 (-212.5, 50) -> (-212.5, 0)
  point P0 (0, 0)
  dimension "d148" = 42
  dimension "d149" = 7.5
extrude "Extrusion25" add sketch "Sketch32" against normal blind 7.5
sketch "Sketch33" plane through (0, 7.5, 0) normal (0, 1, 0) x (1, 0, 0)
  line L0 (-220, -50) -> (0, -50) construction
  line L1 (-220, -50) -> (-254, -50) construction
  line L2 (-254, -50) -> (-254, 0) construction
  line L3 (-254, 0) -> (-220, 0) construction
  line L4 (-220, 0) -> (-220, -50) construction
  line L5 (-227.5, -50) -> (-227.5, 0)
  line L6 (-220, 0) -> (-220, -50)
  line L7 (-227.5, -50) -> (-227.5, 25)
  line L8 (-227.5, 25) -> (-220, 25)
  line L9 (-220, 25) -> (-220, -50)
  line L10 (-227.5, -50) -> (-227.5, -75)
  line L11 (-227.5, -75) -> (-220, -75)
  line L12 (-220, -75) -> (-220, -50)
  line L13 (-220, 25) -> (-227.5, 25)
  line L14 (-227.5, 25) -> (-227.5, -75)
  line L15 (-227.5, -75) -> (-220, -75)
  line L16 (-220, -75) -> (-220, 25)
  line L17 (-220, -75) -> (-254, -75)
  line L18 (-254, -75) -> (-254, -70)
  line L19 (-254, -70) -> (-220, -70)
  line L20 (-220, -70) -> (-220, -75)
  line L21 (-220, 25) -> (-254, 25)
  line L22 (-254, 25) -> (-254, 20)
  line L23 (-254, 20) -> (-220, 20)
  line L24 (-220, 20) -> (-220, 25)
  point P0 (0, 0)
  dimension "d152" = 34
  dimension "d153" = 7.5
  dimension "d154" = 75
  dimension "d155" = 25
  dimension "d156" = 5
  dimension "d157" = 5
extrude "Extrusion26" add sketch "Sketch33" against normal blind 7.5
sketch "Sketch34" plane through (-220, 7.5, -25) normal (0, 0, -1) x (-1, 0, 0)
  point P0 (-220, -7.5)
sketch "Sketch35" plane through (-220, 7.5, -25) normal (0, 0, -1) x (-1, 0, 0)
  line L0 (34, 0) -> (34, -7.5) construction
  line L1 (7.5, 0) -> (34, 0) construction
  line L2 (34, -7.5) -> (30, -7.5) construction
  line L3 (30, -7.5) -> (30, 0) construction
  line L4 (30, 0) -> (34, 0) construction
  line L5 (34, 0) -> (34, -7.5) construction
  line L6 (30, -7.5) -> (28, -7.5) construction
  line L7 (0, -7.5) -> (34, -7.5) construction
  line L8 (28, -7.5) -> (30, 0) construction
  line L9 (28, 0) -> (30, -7.5) construction
  circle A0 centre (29, -3.75) radius 2 construction
  point P0 (-220, -7.5)
  dimension "d160" = 4
  dimension "d161" = 2
  dimension "d162" = 4
hole "Hole6" at (-249, 3.75, -25) direction (0, 0, 1) diameter 4 depth 800 tip angle 118
sketch "Sketch36" plane through (0, 7.5, 0) normal (0, 1, 0) x (1, 0, 0)
  line L0 (-263.1714, -86.6789) -> (-340.6685, -86.6789)
  line L1 (-340.6685, -86.6789) -> (-340.6685, 74.1568)
  line L2 (-340.6685, 74.1568) -> (-263.1714, 74.1568)
  line L3 (-263.1714, 74.1568) -> (-263.1714, -86.6789)
  point P0 (0, 0)
extrude "Extrusion27" cut sketch "Sketch36" against normal blind 700
fillet "Fillet7" radius 2 1 edges at (-227.5, 3.75, 70)
fillet "Fillet8" radius 2 1 edges at (-227.5, 3.75, -20)
fillet "Fillet9" radius 2 1 edges at (-220, 3.75, 75)
fillet "Fillet10" radius 2 1 edges at (-220, 3.75, -25)
properties part number "mtv_frame(BrakeInBack)1-13"
